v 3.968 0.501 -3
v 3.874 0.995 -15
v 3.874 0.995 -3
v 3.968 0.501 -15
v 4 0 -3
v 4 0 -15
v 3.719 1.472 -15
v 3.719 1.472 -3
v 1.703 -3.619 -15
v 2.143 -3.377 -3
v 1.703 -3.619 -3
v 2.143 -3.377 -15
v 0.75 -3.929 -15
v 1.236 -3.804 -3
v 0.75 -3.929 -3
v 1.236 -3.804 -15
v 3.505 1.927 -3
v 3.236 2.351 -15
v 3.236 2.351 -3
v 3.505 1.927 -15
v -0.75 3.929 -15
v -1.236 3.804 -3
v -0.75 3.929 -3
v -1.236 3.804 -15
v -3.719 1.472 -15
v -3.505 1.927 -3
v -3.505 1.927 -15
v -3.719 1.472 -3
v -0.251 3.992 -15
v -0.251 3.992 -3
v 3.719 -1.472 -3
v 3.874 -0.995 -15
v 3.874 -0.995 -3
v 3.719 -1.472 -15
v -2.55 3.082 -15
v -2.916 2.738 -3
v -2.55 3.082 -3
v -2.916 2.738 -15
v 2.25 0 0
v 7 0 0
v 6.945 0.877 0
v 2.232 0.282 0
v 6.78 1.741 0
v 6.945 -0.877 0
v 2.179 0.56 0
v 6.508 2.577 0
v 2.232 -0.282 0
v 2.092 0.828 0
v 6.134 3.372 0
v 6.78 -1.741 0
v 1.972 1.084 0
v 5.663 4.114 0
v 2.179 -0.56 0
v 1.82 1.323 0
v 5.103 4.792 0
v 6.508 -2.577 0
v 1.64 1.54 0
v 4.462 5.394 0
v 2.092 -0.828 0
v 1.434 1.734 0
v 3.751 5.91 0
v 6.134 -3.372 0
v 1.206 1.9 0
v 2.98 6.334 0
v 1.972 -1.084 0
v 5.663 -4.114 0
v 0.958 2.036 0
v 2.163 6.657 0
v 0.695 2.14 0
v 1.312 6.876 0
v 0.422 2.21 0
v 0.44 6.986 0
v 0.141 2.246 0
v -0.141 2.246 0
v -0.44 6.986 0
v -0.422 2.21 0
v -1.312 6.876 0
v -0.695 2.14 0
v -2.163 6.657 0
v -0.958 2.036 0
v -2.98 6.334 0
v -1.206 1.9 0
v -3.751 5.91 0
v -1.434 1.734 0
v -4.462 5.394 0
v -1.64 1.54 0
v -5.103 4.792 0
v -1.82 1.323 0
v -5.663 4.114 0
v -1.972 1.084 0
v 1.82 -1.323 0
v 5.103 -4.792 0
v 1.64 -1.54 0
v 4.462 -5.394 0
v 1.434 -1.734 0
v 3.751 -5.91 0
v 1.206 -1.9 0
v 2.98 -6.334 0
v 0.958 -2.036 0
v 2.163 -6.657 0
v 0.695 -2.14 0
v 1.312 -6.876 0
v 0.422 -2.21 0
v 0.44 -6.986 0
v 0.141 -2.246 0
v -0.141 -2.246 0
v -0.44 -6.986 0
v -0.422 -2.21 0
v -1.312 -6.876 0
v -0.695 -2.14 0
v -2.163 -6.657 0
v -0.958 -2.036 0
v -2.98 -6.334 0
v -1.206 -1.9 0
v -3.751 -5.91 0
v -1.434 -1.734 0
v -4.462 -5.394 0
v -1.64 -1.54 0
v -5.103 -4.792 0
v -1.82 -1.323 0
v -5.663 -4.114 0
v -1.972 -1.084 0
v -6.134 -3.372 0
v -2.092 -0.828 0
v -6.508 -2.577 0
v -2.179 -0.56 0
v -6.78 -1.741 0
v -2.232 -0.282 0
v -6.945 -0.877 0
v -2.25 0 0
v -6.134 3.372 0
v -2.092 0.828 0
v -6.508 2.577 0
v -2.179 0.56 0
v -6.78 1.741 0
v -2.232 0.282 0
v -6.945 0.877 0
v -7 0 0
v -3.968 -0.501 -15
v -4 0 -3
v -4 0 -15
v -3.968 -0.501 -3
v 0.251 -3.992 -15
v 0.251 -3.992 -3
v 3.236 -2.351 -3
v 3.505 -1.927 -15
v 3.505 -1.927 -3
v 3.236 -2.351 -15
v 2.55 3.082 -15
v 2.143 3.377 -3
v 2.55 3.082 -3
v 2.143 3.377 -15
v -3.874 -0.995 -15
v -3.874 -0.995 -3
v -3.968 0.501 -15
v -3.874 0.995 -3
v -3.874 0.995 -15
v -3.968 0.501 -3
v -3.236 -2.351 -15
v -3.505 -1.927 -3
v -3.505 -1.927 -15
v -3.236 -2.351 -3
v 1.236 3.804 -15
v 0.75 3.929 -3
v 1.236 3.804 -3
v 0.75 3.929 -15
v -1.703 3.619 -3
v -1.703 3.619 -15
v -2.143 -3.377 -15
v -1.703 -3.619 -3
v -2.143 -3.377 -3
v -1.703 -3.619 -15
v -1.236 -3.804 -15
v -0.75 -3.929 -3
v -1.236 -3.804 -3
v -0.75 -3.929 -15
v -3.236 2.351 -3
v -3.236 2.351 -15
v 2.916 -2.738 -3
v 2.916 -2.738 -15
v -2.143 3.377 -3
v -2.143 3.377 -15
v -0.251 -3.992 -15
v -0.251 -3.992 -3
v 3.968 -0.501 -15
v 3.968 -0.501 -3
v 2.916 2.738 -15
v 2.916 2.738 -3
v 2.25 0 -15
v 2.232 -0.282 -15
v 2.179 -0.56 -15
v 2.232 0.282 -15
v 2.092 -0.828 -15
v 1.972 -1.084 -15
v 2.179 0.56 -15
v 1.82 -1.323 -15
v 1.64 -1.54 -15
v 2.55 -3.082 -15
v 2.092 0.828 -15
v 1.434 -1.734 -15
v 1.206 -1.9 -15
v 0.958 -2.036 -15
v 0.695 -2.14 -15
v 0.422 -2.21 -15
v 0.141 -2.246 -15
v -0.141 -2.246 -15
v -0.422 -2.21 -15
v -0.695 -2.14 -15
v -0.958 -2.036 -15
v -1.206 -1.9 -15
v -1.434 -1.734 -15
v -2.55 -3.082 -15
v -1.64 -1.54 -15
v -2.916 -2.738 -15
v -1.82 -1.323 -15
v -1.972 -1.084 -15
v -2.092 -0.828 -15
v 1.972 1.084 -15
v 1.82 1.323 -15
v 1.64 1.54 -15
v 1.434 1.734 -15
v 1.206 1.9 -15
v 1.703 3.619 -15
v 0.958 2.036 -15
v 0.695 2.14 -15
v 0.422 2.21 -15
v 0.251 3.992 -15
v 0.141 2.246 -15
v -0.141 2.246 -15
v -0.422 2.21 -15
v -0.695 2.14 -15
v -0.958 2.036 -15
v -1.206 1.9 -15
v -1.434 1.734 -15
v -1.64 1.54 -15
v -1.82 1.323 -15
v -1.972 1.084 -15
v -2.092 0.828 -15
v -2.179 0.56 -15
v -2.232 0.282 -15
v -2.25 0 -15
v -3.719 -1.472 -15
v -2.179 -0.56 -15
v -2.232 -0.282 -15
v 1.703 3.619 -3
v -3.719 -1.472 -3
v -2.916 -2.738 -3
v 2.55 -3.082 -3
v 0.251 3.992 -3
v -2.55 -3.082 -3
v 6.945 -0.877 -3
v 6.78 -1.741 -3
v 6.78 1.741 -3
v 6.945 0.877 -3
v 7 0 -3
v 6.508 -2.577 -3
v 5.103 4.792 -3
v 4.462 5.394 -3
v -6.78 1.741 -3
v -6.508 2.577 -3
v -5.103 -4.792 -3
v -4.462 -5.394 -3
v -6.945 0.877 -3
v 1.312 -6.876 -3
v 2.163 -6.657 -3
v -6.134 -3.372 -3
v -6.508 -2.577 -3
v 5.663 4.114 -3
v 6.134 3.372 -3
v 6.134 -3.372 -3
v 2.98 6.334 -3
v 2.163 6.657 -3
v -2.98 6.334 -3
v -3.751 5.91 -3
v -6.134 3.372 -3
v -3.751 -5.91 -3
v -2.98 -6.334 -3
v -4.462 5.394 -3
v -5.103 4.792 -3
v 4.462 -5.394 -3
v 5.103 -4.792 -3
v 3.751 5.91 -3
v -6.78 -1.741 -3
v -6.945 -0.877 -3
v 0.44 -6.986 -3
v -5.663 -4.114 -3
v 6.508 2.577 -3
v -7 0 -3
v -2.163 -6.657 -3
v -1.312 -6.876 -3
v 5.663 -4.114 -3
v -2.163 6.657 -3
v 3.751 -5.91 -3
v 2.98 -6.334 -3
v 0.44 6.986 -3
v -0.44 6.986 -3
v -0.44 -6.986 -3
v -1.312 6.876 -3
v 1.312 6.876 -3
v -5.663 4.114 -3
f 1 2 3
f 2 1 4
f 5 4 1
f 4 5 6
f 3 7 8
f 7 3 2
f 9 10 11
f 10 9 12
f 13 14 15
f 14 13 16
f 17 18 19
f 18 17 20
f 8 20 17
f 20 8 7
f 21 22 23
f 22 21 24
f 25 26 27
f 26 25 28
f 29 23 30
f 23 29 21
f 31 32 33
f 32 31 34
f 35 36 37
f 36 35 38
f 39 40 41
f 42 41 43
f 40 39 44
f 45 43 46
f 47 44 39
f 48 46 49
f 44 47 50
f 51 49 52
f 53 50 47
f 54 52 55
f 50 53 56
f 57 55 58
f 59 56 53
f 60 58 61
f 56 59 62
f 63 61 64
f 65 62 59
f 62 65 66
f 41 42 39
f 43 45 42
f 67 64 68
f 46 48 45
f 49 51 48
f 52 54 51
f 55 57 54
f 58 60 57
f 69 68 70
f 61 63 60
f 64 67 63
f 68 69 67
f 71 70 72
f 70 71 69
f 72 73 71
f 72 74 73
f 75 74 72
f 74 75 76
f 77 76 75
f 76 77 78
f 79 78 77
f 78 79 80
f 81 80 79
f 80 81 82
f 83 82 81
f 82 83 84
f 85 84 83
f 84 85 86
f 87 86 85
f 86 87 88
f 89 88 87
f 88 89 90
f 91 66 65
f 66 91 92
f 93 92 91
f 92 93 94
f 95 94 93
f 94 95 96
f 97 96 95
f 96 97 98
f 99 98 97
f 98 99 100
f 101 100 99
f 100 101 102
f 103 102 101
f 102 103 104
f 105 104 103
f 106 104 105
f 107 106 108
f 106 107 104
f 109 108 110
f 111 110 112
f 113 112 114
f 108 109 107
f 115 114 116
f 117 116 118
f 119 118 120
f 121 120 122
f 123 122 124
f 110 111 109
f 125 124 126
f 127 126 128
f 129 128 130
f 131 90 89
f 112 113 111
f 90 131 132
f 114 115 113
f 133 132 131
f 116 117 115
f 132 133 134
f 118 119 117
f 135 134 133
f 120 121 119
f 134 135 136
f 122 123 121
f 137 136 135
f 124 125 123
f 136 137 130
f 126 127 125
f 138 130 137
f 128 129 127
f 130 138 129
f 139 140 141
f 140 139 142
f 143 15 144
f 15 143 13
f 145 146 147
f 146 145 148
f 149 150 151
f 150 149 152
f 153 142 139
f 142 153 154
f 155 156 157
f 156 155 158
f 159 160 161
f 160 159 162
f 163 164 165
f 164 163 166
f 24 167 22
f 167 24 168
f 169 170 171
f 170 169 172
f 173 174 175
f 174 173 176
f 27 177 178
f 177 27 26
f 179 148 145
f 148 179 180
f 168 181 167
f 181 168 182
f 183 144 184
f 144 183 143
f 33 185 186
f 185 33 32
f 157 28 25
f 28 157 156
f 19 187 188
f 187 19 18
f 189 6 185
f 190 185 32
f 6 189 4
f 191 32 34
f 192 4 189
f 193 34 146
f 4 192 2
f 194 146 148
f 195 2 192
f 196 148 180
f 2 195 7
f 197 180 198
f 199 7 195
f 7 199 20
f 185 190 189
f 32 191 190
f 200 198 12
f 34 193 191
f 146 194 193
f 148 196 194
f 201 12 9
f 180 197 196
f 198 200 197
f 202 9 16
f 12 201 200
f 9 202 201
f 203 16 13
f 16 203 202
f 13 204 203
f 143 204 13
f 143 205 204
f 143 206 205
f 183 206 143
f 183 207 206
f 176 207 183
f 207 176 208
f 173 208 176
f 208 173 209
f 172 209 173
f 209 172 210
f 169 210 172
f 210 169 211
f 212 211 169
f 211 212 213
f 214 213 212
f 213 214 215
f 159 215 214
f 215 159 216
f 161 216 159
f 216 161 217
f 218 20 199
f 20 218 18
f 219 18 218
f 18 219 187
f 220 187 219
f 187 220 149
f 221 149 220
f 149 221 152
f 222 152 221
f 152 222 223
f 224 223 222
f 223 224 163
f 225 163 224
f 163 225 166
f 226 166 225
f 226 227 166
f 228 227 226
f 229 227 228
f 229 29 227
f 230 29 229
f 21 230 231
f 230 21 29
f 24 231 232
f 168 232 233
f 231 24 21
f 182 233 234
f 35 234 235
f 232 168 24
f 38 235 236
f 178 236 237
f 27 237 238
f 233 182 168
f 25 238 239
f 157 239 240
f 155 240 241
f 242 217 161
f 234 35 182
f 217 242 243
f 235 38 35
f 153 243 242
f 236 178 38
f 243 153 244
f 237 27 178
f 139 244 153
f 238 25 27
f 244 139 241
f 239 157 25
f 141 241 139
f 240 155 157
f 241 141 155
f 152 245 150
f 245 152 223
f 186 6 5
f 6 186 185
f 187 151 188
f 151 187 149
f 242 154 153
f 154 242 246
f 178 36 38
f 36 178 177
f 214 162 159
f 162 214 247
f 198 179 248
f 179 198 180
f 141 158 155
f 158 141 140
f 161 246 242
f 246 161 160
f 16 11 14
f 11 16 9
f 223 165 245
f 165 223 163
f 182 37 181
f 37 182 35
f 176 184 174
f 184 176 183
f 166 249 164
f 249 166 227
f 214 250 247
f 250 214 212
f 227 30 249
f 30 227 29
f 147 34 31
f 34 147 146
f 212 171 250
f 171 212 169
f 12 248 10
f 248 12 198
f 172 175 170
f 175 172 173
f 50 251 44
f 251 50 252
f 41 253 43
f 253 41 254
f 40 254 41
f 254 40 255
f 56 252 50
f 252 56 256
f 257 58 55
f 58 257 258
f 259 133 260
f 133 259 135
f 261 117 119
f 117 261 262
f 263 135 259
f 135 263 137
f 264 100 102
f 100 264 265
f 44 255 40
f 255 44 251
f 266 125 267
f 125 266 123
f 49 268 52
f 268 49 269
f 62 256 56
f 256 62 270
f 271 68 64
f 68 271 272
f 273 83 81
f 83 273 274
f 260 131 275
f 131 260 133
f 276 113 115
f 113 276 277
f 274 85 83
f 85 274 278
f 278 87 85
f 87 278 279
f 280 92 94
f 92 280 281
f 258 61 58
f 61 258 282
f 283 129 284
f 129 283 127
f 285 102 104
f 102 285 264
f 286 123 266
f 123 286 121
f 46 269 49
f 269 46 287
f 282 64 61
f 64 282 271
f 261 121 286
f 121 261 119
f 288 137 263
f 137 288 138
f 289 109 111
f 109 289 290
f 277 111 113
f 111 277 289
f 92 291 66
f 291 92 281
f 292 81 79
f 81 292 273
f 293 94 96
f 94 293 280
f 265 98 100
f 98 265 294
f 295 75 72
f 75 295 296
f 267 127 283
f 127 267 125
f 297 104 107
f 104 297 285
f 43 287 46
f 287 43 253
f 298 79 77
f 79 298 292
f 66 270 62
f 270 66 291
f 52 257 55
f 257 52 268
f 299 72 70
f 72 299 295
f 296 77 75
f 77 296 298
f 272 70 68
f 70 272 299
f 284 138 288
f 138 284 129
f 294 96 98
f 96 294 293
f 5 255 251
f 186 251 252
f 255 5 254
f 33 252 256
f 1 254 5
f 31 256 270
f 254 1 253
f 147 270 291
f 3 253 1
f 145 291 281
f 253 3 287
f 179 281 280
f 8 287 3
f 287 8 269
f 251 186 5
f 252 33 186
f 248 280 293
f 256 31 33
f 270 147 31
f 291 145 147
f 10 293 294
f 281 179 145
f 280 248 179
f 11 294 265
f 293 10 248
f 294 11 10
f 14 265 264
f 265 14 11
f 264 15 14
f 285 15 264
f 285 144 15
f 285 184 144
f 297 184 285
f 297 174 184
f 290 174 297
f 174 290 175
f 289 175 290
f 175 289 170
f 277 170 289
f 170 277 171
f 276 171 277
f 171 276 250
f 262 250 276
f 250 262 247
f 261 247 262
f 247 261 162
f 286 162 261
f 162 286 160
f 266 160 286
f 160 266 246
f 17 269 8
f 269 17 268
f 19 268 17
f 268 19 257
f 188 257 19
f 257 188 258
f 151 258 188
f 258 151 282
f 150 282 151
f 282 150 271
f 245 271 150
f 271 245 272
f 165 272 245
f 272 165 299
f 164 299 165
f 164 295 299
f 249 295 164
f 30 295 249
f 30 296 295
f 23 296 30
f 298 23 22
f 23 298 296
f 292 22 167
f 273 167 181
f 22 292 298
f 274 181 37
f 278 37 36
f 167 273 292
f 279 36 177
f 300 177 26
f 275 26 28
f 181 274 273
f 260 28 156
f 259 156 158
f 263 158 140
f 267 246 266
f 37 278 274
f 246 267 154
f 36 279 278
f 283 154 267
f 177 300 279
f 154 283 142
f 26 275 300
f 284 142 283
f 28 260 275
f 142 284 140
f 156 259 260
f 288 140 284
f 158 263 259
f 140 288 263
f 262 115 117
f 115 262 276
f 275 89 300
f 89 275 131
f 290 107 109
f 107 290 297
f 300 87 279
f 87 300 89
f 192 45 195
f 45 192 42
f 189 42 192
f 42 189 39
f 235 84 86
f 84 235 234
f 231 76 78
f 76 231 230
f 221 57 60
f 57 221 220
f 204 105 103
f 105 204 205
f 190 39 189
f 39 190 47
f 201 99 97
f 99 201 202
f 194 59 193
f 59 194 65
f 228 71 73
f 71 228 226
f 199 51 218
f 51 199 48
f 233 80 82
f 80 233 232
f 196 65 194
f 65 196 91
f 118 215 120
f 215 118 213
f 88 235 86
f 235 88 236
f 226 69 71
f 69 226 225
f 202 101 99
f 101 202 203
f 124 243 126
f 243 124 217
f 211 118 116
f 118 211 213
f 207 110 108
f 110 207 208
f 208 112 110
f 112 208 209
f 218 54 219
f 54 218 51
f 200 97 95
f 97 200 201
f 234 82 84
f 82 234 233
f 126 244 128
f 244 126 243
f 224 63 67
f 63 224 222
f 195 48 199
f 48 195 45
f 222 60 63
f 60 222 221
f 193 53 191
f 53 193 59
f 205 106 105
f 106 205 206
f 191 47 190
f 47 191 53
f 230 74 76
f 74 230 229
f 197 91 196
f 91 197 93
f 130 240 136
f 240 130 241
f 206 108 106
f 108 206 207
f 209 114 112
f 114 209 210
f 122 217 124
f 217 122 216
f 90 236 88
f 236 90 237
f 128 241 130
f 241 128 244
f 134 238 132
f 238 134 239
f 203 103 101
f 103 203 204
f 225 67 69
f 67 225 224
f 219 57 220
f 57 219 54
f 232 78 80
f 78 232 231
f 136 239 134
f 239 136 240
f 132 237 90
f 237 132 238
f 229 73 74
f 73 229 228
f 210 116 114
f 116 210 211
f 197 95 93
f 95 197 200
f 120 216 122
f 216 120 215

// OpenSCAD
$fn = 50;


difference() {
	union() {
		translate(v = [0, 0, -15.0000000000]) {
			cylinder(h = 15, r = 4.0000000000);
		}
		translate(v = [0, 0, -3.0000000000]) {
			cylinder(h = 3, r = 7.0000000000);
		}
	}
	union() {
		#translate(v = [0, 0, -15]) {
			cylinder(h = 15, r = 2.2500000000);
		}
	}
}
